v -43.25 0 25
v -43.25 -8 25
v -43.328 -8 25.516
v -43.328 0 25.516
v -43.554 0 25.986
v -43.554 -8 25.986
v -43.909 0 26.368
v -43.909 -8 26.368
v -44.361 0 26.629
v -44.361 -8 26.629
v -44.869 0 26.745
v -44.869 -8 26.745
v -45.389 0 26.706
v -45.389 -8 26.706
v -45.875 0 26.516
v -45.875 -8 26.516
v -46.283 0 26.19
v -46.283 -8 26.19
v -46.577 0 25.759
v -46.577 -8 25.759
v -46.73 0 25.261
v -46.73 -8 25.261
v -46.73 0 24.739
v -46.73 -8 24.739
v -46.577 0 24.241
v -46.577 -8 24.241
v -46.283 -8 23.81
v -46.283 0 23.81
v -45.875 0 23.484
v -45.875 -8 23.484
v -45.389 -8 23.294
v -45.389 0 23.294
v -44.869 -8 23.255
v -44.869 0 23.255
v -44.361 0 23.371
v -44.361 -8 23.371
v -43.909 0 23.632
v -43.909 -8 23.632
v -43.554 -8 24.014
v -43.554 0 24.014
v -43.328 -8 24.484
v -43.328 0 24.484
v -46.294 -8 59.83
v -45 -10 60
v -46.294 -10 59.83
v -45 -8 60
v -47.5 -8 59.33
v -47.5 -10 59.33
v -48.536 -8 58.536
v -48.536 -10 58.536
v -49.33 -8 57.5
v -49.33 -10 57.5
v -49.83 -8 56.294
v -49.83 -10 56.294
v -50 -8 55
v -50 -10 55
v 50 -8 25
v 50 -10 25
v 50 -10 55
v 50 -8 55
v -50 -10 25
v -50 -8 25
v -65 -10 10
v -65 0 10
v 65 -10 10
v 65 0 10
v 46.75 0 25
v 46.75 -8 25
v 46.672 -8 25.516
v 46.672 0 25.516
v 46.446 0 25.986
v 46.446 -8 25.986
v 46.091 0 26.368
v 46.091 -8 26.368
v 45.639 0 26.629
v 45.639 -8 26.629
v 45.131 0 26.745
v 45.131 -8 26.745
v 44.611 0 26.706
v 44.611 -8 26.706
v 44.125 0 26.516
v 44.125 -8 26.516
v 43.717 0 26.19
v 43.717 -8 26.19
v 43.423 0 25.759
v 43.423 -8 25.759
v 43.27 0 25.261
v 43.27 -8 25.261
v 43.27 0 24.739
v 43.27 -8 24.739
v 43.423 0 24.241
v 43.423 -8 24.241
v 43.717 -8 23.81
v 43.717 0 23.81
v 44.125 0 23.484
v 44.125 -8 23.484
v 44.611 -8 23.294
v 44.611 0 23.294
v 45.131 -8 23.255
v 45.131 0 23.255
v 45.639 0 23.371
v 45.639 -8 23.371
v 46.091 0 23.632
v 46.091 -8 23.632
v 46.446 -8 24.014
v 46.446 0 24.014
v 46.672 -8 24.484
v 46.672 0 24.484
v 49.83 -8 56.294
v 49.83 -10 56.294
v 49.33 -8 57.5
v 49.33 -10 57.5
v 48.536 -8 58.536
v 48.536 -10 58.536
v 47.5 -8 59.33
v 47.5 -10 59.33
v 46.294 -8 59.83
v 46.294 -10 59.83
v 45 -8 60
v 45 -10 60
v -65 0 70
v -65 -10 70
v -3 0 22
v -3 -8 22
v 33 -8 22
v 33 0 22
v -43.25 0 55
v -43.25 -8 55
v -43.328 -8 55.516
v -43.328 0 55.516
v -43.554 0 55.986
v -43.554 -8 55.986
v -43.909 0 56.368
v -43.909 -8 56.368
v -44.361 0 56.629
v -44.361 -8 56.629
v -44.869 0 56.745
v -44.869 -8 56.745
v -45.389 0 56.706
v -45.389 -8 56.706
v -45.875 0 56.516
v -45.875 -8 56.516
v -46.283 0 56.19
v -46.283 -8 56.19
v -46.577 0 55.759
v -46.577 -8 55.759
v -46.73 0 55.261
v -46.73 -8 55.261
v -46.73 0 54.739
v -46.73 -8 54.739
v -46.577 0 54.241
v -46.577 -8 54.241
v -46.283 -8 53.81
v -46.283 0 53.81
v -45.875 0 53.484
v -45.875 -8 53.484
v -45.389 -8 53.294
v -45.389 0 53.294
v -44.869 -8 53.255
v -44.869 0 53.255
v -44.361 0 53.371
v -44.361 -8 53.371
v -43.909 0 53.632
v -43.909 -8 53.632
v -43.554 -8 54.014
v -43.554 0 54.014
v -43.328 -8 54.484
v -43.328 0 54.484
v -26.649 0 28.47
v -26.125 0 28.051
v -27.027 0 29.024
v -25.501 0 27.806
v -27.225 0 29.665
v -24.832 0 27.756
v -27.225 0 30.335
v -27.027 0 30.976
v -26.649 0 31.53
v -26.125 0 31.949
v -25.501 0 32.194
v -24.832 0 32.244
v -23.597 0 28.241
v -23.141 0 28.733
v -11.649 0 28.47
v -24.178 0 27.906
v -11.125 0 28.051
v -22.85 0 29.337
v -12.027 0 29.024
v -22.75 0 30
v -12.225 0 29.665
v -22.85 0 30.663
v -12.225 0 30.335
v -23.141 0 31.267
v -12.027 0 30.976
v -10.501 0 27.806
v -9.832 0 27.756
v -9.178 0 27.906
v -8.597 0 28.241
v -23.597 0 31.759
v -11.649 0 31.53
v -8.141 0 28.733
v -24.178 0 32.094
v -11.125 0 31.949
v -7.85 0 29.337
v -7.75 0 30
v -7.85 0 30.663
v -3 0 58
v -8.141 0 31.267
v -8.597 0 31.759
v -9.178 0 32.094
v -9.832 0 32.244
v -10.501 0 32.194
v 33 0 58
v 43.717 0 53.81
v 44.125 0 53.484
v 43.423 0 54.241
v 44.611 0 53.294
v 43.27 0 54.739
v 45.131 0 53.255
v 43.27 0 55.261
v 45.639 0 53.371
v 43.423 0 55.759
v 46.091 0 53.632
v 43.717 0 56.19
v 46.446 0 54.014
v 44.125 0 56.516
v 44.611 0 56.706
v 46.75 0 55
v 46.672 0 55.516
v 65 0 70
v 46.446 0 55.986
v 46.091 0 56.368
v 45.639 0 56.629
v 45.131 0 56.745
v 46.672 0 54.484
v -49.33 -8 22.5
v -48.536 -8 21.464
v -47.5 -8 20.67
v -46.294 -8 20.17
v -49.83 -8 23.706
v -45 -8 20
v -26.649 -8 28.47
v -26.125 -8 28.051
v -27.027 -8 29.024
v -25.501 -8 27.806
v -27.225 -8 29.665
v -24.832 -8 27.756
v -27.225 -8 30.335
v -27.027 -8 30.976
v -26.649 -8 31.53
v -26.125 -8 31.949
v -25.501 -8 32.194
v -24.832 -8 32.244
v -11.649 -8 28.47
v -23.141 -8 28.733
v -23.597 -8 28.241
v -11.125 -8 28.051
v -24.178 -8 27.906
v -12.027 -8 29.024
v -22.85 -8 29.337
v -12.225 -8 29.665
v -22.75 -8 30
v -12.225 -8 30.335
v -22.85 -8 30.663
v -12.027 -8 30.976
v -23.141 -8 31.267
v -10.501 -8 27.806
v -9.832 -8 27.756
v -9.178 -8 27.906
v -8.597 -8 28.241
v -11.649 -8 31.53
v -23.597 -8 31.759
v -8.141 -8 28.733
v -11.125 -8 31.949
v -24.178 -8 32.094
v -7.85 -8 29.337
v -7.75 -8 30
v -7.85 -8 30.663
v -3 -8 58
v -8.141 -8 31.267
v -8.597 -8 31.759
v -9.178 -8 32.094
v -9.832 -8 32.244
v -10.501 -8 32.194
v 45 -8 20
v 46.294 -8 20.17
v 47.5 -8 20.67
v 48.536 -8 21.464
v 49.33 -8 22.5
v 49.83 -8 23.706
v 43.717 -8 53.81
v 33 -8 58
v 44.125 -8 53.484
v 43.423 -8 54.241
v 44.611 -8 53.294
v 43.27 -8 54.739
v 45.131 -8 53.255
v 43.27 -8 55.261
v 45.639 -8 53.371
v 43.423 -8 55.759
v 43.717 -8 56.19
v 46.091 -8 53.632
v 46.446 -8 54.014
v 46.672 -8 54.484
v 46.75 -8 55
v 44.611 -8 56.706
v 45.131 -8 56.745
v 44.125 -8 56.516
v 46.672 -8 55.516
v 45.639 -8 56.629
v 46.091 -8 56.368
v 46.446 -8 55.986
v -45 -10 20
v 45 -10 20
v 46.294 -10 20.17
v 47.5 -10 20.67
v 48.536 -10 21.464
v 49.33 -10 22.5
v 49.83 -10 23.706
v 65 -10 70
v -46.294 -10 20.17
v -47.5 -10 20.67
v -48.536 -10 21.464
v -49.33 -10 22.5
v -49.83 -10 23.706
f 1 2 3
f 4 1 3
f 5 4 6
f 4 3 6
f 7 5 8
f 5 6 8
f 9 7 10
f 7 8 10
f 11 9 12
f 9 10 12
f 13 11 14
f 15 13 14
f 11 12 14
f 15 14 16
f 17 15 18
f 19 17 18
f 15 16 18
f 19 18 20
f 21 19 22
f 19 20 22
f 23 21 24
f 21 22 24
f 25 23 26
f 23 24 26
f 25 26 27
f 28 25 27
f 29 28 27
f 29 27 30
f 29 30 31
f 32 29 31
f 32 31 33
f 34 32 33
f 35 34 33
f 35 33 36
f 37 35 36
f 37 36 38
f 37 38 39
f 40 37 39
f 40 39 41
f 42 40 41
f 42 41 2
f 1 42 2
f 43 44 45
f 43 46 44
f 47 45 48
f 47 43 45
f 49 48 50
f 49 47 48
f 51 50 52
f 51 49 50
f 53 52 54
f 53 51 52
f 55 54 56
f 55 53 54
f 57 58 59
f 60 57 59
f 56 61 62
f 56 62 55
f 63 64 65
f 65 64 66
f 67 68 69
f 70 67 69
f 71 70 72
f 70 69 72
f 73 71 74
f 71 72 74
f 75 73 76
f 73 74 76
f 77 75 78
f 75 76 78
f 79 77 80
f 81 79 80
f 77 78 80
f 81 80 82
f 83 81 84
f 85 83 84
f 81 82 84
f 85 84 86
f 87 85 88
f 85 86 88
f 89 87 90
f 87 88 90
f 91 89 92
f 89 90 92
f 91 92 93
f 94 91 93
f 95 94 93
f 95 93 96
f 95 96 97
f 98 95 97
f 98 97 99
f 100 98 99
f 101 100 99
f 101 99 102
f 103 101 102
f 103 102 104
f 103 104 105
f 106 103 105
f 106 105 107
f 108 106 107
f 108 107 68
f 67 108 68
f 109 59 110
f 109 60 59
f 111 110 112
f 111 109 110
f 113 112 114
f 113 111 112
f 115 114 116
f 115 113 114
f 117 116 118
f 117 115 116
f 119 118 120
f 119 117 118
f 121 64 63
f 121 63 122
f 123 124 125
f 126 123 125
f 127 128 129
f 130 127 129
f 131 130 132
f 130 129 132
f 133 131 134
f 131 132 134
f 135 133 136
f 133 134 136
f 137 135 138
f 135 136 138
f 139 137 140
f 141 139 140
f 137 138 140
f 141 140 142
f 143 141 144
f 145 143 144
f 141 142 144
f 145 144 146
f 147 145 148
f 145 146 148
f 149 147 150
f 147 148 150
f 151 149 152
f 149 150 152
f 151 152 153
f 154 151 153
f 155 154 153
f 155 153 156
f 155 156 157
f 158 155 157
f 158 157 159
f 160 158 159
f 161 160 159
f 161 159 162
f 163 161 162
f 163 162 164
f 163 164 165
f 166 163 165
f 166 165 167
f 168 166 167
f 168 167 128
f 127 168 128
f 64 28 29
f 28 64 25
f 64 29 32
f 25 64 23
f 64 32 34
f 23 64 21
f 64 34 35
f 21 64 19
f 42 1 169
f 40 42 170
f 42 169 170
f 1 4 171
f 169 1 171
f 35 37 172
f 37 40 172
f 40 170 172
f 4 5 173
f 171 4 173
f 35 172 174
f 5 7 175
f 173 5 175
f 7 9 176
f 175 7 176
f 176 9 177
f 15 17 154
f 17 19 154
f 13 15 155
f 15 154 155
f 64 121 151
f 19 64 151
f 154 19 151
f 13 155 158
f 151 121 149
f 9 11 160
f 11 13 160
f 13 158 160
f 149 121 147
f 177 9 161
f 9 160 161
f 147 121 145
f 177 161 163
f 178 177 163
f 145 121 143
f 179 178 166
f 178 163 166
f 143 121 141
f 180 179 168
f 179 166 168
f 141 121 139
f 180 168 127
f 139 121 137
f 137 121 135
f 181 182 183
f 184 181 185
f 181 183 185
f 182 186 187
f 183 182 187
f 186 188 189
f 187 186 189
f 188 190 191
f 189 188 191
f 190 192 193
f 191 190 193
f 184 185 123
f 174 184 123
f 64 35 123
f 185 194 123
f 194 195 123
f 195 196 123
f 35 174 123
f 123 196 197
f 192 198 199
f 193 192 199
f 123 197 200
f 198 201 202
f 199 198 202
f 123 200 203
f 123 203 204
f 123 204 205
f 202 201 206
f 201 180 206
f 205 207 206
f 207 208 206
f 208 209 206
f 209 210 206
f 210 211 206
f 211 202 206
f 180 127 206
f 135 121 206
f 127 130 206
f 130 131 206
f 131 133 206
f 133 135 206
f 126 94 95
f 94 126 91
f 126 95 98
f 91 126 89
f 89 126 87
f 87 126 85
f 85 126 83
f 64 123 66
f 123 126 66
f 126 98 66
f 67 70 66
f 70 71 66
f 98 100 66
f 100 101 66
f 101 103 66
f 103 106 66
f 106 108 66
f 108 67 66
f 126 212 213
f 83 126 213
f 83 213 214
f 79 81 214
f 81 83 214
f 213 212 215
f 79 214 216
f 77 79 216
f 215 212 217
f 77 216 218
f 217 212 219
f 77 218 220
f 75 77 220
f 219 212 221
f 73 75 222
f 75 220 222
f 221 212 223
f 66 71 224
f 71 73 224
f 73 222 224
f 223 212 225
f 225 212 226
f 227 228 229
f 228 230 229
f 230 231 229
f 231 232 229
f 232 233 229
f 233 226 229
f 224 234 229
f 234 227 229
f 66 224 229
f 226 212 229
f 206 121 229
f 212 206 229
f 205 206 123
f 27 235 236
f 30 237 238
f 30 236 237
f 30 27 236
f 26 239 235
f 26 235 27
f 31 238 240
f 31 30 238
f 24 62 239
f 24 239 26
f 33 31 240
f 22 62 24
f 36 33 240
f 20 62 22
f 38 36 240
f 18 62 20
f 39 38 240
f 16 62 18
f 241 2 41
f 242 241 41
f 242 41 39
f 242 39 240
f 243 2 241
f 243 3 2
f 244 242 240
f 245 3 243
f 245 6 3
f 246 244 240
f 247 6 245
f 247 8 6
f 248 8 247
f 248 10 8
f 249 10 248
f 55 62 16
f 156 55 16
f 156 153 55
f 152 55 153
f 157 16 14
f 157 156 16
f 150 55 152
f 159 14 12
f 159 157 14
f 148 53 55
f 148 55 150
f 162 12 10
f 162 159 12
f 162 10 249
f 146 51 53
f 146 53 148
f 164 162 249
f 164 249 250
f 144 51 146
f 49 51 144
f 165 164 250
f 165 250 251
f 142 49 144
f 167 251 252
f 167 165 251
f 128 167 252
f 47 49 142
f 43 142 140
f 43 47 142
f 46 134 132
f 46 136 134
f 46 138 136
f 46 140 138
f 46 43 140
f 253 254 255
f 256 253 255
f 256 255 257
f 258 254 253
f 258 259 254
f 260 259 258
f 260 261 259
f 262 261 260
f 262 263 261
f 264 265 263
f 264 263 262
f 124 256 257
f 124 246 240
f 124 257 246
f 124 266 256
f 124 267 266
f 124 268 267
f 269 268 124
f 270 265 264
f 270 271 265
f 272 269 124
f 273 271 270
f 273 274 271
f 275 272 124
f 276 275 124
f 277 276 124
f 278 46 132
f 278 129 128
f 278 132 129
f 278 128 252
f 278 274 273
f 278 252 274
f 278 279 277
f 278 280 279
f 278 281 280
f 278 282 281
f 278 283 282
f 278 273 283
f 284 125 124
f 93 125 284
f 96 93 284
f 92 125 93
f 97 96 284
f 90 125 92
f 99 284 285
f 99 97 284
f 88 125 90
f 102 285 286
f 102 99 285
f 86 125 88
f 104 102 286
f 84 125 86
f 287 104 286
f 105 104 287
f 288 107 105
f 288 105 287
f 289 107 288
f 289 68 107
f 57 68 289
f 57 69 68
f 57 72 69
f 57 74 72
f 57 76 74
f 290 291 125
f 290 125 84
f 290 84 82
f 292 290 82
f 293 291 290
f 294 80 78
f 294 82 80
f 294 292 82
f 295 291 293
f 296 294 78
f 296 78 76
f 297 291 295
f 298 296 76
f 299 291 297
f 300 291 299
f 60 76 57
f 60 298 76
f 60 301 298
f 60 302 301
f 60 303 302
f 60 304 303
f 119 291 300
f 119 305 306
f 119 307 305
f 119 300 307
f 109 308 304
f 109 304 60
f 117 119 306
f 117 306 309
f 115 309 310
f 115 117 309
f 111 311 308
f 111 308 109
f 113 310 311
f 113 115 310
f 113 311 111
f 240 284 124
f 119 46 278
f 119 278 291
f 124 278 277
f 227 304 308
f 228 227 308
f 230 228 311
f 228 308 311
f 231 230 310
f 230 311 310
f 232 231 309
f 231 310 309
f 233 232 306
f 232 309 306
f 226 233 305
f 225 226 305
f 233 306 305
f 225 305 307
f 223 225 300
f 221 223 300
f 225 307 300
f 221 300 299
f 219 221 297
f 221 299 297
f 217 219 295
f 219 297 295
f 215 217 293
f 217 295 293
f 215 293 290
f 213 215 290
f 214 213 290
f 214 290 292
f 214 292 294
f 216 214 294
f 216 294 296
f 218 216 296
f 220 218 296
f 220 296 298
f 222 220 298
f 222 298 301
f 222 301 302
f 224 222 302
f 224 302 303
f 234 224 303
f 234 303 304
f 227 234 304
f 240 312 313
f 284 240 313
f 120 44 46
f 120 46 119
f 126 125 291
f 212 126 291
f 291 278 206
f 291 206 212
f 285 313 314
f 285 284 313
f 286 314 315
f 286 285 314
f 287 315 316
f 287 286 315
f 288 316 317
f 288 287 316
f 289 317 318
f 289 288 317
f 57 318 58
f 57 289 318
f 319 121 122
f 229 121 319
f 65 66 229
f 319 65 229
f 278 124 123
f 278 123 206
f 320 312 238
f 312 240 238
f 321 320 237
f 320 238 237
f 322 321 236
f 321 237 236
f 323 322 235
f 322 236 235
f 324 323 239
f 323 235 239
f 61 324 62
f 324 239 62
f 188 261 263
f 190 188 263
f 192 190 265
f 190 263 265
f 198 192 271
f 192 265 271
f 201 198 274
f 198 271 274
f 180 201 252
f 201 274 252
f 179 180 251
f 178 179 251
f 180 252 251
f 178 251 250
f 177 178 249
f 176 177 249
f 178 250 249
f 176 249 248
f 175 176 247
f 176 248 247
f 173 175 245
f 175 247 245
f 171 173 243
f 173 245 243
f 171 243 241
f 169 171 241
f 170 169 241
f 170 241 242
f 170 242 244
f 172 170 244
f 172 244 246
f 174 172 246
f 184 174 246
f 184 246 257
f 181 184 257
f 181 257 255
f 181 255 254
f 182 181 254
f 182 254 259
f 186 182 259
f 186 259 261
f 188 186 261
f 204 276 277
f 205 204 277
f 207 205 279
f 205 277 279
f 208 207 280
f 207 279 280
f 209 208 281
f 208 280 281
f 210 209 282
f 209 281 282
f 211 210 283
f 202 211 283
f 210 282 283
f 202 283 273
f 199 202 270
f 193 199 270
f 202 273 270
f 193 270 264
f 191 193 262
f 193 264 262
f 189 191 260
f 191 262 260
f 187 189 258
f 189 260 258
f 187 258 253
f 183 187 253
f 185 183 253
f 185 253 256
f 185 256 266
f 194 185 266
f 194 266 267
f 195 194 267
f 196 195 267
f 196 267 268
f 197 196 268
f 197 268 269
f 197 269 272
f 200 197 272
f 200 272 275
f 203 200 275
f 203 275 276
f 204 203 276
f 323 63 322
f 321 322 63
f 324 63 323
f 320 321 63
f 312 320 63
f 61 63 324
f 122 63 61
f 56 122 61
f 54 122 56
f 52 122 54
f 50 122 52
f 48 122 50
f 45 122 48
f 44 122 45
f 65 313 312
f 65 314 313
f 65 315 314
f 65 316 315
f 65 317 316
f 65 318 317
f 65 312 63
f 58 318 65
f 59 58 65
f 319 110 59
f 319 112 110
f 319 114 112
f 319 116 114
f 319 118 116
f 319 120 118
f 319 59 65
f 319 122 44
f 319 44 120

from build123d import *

# Parameters (mm, degrees)
SKETCH022_W          = 130
SKETCH022_H          = 60
PAD008_DEPTH         = 10
SKETCH023_R          = 2.25
SKETCH023_R_2        = 1.75
SKETCH023_W          = 36
SKETCH023_H          = 36
POCKET014_DEPTH      = 10.001
POCKET014_DEPTH_BACK = 0.001
SKETCH024_W          = 100
SKETCH024_H          = 40
POCKET015_DEPTH      = 2
FILLET002_R          = 5


with BuildPart() as part:
    # Sketch022 → Pad008 (new body)
    with BuildSketch(Plane.XZ):
        with Locations((0, 40)):
            Rectangle(SKETCH022_W, SKETCH022_H)
    extrude(amount=PAD008_DEPTH)

    # Sketch023 (on Face6 of Pad008) → Pocket014 (cut, two sides)
    with BuildSketch(Plane.XZ.offset(10)) as pocket014_sk:
        with Locations((-25, 30)):
            Circle(SKETCH023_R)
        with Locations((-10, 30)):
            Circle(SKETCH023_R)
        with Locations((-45, 55)):
            Circle(SKETCH023_R_2)
        with Locations((-45, 25)):
            Circle(SKETCH023_R_2)
        with Locations((45, 55)):
            Circle(SKETCH023_R_2)
        with Locations((45, 25)):
            Circle(SKETCH023_R_2)
        with Locations((15, 40)):
            Rectangle(SKETCH023_W, SKETCH023_H)
    extrude(amount=-POCKET014_DEPTH, mode=Mode.SUBTRACT)
    extrude(pocket014_sk.sketch, amount=POCKET014_DEPTH_BACK, mode=Mode.SUBTRACT)

    # Sketch024 (on Face5 of Pocket014) → Pocket015 (cut)
    with BuildSketch(Plane.XZ.offset(10)):
        with Locations((0, 40)):
            Rectangle(SKETCH024_W, SKETCH024_H)
    extrude(amount=-POCKET015_DEPTH, mode=Mode.SUBTRACT)

    # Fillet002
    fillet002_edges = [part.edges().sort_by_distance(p)[0] for p in [
        (50, -9, 60),
        (50, -9, 20),
        (-50, -9, 20),
        (-50, -9, 60),
    ]]
    fillet(fillet002_edges, radius=FILLET002_R)


solid = part.part
